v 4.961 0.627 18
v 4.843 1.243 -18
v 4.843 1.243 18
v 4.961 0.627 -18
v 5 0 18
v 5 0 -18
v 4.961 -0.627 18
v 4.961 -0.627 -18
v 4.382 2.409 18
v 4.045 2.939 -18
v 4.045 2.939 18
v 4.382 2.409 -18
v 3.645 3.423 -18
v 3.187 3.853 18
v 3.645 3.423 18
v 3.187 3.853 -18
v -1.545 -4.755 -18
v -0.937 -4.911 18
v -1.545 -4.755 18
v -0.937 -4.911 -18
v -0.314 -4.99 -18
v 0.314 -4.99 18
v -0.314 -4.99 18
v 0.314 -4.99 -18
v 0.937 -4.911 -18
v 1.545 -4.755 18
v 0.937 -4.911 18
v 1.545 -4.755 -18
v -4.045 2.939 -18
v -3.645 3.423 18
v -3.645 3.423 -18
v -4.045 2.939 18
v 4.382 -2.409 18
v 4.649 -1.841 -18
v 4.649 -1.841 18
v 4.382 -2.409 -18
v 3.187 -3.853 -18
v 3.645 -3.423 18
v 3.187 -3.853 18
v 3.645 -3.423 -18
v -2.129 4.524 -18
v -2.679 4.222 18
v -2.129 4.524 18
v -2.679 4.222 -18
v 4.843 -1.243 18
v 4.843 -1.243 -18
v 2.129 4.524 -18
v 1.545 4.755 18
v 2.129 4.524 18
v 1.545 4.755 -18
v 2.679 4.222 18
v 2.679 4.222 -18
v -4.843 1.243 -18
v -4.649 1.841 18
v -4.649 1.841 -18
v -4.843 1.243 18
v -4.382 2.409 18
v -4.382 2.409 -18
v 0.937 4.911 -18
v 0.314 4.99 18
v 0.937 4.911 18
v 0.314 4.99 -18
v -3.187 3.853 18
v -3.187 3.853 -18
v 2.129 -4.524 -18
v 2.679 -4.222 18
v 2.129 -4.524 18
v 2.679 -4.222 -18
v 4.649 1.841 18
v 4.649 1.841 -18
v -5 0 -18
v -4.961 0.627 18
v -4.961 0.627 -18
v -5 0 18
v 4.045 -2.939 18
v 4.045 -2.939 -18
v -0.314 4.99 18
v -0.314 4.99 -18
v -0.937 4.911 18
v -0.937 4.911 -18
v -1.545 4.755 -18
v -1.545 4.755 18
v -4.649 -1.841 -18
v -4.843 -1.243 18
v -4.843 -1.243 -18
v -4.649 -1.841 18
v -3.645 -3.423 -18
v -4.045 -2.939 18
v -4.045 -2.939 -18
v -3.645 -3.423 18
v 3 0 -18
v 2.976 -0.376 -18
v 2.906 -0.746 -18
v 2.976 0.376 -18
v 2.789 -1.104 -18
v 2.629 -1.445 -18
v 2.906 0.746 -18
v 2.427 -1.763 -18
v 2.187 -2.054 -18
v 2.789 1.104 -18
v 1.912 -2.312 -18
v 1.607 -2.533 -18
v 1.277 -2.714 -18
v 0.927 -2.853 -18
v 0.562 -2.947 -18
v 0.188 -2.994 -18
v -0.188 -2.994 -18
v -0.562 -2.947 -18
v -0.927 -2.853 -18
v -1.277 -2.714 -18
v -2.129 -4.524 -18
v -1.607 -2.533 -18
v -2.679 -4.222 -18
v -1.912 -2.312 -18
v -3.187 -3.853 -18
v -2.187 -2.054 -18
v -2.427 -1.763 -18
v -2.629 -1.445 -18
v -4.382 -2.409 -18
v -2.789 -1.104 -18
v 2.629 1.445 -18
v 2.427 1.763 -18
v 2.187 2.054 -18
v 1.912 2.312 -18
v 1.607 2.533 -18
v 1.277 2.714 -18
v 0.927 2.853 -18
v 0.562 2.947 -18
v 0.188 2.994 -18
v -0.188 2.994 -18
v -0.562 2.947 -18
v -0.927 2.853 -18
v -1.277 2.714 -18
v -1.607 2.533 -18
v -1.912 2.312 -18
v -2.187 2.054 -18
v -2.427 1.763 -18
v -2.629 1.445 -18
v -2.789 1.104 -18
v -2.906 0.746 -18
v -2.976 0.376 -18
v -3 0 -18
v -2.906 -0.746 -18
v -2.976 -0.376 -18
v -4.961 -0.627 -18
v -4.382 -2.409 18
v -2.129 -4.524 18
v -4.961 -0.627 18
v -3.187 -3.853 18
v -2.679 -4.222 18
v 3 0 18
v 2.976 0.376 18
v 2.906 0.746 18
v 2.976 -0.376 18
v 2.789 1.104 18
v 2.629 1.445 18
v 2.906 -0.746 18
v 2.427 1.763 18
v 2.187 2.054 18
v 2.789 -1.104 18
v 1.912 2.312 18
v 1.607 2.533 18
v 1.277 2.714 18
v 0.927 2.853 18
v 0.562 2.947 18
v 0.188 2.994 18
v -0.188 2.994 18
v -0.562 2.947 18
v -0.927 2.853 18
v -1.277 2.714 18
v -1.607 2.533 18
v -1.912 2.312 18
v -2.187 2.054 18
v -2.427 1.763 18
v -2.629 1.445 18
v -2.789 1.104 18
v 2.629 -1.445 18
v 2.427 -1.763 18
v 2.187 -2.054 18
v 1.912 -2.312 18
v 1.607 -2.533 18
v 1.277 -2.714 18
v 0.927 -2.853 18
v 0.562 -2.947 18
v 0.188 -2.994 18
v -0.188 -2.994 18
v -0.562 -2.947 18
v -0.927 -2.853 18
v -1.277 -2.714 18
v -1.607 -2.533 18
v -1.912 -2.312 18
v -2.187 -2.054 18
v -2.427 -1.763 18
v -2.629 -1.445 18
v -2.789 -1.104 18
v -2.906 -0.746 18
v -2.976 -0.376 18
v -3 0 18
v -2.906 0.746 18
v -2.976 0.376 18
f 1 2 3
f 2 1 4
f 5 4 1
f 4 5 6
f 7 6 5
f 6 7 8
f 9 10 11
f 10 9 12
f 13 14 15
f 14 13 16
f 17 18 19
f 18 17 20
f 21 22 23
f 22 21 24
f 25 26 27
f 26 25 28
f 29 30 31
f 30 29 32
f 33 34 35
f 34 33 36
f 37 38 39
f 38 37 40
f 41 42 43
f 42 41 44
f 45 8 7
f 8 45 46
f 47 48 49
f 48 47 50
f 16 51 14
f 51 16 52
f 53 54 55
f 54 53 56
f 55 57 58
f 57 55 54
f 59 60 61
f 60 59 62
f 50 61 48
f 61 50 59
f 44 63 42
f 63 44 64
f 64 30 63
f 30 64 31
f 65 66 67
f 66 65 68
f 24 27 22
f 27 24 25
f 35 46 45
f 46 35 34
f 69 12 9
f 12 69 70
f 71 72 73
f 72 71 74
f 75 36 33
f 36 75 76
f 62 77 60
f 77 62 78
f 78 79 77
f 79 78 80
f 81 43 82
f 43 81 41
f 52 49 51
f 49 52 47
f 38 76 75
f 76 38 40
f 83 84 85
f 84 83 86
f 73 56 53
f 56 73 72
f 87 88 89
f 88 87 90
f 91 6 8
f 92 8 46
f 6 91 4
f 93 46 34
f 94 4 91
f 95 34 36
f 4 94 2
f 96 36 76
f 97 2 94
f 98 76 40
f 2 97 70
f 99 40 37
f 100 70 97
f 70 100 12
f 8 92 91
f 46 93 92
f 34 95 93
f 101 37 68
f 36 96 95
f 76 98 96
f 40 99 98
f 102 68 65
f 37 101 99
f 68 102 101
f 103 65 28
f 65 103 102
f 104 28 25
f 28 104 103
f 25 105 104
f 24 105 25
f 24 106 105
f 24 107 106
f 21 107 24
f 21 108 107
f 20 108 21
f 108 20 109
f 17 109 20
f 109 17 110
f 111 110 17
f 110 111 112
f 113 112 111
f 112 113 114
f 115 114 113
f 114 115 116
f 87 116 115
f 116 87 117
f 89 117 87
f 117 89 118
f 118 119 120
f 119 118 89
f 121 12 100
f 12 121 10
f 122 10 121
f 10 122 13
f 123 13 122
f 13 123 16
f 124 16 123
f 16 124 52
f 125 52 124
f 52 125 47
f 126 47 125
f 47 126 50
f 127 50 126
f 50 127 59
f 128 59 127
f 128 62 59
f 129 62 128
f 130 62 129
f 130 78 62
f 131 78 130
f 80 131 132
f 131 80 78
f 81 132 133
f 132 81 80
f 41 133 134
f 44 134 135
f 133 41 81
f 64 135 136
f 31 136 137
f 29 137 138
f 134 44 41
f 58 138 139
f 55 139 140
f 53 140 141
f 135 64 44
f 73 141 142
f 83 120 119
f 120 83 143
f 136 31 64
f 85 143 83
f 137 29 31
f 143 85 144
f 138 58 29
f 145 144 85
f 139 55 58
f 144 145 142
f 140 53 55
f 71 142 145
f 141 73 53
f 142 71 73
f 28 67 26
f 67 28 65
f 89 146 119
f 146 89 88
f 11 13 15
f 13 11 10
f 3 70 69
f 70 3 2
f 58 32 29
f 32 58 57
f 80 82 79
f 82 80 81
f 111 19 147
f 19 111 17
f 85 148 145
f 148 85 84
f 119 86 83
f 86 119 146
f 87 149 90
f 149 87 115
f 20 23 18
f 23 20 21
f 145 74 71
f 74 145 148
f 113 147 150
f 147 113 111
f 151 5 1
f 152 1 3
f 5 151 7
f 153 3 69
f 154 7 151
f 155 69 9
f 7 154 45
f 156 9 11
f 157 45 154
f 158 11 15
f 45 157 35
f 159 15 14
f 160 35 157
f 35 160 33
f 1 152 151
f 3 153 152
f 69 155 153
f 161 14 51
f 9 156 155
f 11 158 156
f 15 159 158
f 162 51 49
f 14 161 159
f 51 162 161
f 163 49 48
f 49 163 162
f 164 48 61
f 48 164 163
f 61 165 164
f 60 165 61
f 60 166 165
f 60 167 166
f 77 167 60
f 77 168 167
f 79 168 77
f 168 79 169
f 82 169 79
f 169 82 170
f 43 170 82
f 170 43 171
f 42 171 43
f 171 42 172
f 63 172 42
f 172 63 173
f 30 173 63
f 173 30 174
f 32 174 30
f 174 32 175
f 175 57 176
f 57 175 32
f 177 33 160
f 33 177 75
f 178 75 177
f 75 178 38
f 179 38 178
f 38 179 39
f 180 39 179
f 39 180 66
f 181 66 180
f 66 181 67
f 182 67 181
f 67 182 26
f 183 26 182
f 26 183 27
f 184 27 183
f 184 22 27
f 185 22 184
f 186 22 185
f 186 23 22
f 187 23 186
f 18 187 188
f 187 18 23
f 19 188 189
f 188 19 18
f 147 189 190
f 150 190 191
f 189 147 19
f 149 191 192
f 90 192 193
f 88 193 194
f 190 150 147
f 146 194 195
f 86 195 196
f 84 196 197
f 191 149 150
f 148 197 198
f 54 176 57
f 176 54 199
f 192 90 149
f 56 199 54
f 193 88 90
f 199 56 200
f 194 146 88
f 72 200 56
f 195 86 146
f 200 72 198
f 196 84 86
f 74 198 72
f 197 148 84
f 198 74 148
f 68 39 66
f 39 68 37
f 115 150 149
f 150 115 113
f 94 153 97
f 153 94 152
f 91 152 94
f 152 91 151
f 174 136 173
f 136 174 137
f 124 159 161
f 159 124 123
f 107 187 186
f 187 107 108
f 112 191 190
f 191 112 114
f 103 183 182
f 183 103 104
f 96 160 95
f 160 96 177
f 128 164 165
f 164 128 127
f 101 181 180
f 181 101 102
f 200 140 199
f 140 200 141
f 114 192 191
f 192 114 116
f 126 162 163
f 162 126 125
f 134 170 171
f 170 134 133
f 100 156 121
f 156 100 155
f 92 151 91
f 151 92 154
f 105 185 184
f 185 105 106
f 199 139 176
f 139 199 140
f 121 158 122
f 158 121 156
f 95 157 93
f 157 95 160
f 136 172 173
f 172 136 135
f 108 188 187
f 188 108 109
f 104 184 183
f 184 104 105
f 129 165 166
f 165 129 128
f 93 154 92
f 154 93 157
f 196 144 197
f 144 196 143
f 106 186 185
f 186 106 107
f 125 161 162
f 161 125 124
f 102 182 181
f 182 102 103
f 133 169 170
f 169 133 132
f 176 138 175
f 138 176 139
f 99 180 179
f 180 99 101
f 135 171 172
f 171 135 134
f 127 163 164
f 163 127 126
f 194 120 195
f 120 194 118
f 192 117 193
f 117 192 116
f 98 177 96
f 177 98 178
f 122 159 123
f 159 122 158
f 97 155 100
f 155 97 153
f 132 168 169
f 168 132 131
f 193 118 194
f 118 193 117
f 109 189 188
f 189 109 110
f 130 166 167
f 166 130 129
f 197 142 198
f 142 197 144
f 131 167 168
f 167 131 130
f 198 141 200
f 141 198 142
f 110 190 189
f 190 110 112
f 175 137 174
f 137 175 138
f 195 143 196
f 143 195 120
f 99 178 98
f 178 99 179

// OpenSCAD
$fn = 50;


difference() {
	union() {
		translate(v = [0, 0, -18.0000000000]) {
			cylinder(h = 36, r = 5.0000000000);
		}
	}
	union() {
		translate(v = [0, 0, -100.0000000000]) {
			cylinder(h = 200, r = 3.0000000000);
		}
	}
}
